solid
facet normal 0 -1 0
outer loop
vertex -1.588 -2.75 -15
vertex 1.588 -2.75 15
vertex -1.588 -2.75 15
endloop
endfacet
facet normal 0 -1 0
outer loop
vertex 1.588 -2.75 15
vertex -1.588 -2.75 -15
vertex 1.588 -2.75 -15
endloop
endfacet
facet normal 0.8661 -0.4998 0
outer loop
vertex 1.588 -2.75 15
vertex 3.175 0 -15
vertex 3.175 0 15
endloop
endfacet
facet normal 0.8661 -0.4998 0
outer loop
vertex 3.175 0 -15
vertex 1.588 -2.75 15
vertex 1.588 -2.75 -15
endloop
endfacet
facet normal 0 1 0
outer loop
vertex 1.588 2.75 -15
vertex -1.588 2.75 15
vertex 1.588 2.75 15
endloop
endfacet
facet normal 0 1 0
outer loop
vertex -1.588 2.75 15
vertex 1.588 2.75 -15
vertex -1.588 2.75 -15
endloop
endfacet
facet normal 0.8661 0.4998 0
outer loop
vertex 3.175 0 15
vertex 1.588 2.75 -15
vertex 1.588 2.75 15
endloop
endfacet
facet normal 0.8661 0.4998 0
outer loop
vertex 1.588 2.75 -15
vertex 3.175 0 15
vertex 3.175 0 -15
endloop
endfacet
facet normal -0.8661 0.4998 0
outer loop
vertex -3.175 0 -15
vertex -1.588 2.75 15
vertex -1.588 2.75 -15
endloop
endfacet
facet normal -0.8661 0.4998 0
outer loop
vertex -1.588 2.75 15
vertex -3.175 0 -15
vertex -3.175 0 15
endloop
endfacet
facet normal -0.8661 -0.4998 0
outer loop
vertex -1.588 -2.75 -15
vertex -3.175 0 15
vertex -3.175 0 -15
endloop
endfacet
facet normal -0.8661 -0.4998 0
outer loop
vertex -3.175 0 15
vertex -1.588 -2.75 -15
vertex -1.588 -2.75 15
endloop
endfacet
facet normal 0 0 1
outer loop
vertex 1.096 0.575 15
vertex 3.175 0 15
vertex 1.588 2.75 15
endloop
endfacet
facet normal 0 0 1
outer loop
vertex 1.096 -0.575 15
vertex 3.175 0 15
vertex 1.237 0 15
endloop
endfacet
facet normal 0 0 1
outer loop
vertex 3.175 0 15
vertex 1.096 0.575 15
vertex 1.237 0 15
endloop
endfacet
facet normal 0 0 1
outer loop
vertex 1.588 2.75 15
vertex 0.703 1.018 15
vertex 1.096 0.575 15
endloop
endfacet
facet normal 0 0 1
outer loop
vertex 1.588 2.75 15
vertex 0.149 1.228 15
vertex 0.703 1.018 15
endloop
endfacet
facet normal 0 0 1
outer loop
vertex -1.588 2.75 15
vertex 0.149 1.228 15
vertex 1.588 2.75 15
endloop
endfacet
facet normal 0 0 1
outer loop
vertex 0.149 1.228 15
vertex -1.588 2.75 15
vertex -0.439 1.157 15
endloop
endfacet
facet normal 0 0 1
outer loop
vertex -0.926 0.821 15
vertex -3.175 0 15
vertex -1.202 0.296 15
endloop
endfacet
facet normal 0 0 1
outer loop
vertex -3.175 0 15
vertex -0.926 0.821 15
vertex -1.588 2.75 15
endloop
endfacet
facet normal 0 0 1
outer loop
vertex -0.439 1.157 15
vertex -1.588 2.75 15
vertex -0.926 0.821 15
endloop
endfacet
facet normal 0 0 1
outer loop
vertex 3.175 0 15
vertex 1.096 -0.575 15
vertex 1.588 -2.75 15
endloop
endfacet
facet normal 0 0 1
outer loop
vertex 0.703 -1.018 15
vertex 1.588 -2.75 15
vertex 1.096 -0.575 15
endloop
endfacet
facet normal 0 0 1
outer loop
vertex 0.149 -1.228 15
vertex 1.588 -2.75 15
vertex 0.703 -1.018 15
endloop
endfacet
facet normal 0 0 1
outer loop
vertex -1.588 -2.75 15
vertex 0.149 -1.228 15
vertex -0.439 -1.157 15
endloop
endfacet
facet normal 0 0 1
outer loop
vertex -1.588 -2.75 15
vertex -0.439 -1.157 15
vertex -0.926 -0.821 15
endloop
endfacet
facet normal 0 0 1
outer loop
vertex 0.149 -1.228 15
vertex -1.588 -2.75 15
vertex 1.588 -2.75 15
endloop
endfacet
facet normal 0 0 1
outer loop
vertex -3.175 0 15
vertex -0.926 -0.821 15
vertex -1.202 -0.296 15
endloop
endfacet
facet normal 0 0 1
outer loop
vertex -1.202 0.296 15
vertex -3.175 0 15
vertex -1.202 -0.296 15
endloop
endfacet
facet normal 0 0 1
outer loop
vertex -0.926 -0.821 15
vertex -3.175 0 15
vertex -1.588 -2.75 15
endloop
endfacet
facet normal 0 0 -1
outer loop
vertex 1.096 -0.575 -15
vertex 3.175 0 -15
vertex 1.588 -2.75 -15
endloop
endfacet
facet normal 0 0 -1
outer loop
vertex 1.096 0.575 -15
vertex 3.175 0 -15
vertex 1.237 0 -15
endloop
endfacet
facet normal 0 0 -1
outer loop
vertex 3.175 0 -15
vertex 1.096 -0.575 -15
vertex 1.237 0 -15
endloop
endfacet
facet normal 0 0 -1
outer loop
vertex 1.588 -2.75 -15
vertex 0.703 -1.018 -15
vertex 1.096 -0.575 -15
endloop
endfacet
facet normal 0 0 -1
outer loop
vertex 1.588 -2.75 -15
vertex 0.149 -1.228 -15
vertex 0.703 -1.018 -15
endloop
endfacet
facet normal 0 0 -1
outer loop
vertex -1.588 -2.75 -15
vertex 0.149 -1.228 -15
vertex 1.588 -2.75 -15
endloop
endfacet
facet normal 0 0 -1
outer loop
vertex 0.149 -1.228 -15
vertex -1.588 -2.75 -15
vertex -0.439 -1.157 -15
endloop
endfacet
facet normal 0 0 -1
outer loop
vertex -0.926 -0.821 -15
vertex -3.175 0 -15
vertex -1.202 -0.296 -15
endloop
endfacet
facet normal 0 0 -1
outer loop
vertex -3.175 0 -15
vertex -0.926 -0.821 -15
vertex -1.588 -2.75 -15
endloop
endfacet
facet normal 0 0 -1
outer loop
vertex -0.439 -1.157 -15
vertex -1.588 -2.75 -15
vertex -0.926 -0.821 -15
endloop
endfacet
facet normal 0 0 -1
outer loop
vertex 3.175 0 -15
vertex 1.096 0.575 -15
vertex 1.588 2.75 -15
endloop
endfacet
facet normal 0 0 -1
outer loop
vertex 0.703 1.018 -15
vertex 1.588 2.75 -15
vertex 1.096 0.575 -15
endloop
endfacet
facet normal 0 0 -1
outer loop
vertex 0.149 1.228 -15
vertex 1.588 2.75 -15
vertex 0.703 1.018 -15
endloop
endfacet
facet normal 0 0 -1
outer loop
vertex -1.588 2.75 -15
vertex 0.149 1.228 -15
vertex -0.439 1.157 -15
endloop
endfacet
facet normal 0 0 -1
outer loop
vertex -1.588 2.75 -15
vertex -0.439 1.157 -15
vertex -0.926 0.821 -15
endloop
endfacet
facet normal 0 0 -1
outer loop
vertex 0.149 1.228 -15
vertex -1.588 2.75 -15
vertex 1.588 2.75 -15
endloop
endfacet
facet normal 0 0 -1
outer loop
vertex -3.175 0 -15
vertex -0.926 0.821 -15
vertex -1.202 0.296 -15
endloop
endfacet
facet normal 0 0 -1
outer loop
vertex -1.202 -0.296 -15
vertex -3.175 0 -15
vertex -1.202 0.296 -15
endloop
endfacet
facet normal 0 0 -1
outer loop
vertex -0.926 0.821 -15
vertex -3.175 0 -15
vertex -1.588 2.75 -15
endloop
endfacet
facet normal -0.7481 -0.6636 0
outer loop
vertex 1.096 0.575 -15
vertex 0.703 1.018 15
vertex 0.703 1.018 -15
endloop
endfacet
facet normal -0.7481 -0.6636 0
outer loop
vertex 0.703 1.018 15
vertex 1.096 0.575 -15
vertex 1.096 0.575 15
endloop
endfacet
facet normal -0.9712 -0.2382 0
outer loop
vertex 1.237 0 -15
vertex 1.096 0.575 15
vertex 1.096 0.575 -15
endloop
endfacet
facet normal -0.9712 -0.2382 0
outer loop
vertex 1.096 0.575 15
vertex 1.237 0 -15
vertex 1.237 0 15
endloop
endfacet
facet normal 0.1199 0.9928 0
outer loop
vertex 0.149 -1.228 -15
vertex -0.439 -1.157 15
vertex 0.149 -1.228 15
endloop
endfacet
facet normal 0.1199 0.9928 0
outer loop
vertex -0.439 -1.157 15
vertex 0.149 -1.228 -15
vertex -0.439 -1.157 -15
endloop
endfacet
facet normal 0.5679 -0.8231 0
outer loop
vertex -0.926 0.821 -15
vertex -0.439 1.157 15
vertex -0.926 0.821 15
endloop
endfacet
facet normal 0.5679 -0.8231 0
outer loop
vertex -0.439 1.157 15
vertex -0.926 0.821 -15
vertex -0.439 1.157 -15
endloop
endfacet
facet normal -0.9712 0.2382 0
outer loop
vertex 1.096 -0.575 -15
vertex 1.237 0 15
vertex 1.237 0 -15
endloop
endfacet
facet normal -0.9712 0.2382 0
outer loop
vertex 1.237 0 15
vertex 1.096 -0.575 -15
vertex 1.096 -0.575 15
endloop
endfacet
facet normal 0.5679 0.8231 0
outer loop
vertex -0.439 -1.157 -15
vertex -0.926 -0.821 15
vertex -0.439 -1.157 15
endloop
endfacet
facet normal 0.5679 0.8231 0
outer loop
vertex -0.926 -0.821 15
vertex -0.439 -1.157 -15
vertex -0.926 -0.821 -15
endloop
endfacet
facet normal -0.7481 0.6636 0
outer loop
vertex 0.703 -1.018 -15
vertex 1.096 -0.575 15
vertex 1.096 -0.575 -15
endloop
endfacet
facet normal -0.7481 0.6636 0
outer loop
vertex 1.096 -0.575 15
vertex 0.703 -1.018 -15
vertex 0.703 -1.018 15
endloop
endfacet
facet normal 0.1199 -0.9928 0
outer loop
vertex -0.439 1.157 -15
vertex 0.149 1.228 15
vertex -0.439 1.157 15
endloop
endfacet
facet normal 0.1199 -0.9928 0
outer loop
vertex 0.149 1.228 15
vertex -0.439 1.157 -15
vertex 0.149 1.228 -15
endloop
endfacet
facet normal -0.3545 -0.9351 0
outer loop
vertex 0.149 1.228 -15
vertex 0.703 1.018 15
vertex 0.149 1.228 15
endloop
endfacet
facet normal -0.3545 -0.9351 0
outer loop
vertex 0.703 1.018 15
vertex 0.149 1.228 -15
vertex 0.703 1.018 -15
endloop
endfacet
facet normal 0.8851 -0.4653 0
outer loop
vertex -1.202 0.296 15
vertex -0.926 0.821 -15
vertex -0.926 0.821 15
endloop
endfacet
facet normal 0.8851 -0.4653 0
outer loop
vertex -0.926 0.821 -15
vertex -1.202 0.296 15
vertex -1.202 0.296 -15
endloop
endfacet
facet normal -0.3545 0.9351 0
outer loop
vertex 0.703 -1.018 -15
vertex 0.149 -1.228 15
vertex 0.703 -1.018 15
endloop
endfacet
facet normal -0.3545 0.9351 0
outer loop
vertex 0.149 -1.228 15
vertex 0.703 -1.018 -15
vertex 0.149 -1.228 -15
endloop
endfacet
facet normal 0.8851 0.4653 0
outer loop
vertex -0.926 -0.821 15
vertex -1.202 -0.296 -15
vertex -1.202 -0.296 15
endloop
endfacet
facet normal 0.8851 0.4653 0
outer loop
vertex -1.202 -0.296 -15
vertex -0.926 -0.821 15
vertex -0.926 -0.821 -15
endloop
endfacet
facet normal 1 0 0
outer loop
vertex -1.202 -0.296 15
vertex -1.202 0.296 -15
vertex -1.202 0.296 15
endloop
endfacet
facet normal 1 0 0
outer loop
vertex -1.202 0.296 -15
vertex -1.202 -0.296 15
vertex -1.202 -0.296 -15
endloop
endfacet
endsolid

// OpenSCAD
use <common.scad>

// 용어
// 1. 육각 스탠드오프(hex standoff)
// 2. 대변 거리(across flat)
// 3. 스탠드오프 길이(standoff length)

module hex_standoff_m3_l30(part_color = [0.74, 0.41, 0]) {
    hex_standoff(across_flat = 5.5,
                 standoff_len = 30,
                 part_color = part_color);
}

hex_standoff_m3_l30();
